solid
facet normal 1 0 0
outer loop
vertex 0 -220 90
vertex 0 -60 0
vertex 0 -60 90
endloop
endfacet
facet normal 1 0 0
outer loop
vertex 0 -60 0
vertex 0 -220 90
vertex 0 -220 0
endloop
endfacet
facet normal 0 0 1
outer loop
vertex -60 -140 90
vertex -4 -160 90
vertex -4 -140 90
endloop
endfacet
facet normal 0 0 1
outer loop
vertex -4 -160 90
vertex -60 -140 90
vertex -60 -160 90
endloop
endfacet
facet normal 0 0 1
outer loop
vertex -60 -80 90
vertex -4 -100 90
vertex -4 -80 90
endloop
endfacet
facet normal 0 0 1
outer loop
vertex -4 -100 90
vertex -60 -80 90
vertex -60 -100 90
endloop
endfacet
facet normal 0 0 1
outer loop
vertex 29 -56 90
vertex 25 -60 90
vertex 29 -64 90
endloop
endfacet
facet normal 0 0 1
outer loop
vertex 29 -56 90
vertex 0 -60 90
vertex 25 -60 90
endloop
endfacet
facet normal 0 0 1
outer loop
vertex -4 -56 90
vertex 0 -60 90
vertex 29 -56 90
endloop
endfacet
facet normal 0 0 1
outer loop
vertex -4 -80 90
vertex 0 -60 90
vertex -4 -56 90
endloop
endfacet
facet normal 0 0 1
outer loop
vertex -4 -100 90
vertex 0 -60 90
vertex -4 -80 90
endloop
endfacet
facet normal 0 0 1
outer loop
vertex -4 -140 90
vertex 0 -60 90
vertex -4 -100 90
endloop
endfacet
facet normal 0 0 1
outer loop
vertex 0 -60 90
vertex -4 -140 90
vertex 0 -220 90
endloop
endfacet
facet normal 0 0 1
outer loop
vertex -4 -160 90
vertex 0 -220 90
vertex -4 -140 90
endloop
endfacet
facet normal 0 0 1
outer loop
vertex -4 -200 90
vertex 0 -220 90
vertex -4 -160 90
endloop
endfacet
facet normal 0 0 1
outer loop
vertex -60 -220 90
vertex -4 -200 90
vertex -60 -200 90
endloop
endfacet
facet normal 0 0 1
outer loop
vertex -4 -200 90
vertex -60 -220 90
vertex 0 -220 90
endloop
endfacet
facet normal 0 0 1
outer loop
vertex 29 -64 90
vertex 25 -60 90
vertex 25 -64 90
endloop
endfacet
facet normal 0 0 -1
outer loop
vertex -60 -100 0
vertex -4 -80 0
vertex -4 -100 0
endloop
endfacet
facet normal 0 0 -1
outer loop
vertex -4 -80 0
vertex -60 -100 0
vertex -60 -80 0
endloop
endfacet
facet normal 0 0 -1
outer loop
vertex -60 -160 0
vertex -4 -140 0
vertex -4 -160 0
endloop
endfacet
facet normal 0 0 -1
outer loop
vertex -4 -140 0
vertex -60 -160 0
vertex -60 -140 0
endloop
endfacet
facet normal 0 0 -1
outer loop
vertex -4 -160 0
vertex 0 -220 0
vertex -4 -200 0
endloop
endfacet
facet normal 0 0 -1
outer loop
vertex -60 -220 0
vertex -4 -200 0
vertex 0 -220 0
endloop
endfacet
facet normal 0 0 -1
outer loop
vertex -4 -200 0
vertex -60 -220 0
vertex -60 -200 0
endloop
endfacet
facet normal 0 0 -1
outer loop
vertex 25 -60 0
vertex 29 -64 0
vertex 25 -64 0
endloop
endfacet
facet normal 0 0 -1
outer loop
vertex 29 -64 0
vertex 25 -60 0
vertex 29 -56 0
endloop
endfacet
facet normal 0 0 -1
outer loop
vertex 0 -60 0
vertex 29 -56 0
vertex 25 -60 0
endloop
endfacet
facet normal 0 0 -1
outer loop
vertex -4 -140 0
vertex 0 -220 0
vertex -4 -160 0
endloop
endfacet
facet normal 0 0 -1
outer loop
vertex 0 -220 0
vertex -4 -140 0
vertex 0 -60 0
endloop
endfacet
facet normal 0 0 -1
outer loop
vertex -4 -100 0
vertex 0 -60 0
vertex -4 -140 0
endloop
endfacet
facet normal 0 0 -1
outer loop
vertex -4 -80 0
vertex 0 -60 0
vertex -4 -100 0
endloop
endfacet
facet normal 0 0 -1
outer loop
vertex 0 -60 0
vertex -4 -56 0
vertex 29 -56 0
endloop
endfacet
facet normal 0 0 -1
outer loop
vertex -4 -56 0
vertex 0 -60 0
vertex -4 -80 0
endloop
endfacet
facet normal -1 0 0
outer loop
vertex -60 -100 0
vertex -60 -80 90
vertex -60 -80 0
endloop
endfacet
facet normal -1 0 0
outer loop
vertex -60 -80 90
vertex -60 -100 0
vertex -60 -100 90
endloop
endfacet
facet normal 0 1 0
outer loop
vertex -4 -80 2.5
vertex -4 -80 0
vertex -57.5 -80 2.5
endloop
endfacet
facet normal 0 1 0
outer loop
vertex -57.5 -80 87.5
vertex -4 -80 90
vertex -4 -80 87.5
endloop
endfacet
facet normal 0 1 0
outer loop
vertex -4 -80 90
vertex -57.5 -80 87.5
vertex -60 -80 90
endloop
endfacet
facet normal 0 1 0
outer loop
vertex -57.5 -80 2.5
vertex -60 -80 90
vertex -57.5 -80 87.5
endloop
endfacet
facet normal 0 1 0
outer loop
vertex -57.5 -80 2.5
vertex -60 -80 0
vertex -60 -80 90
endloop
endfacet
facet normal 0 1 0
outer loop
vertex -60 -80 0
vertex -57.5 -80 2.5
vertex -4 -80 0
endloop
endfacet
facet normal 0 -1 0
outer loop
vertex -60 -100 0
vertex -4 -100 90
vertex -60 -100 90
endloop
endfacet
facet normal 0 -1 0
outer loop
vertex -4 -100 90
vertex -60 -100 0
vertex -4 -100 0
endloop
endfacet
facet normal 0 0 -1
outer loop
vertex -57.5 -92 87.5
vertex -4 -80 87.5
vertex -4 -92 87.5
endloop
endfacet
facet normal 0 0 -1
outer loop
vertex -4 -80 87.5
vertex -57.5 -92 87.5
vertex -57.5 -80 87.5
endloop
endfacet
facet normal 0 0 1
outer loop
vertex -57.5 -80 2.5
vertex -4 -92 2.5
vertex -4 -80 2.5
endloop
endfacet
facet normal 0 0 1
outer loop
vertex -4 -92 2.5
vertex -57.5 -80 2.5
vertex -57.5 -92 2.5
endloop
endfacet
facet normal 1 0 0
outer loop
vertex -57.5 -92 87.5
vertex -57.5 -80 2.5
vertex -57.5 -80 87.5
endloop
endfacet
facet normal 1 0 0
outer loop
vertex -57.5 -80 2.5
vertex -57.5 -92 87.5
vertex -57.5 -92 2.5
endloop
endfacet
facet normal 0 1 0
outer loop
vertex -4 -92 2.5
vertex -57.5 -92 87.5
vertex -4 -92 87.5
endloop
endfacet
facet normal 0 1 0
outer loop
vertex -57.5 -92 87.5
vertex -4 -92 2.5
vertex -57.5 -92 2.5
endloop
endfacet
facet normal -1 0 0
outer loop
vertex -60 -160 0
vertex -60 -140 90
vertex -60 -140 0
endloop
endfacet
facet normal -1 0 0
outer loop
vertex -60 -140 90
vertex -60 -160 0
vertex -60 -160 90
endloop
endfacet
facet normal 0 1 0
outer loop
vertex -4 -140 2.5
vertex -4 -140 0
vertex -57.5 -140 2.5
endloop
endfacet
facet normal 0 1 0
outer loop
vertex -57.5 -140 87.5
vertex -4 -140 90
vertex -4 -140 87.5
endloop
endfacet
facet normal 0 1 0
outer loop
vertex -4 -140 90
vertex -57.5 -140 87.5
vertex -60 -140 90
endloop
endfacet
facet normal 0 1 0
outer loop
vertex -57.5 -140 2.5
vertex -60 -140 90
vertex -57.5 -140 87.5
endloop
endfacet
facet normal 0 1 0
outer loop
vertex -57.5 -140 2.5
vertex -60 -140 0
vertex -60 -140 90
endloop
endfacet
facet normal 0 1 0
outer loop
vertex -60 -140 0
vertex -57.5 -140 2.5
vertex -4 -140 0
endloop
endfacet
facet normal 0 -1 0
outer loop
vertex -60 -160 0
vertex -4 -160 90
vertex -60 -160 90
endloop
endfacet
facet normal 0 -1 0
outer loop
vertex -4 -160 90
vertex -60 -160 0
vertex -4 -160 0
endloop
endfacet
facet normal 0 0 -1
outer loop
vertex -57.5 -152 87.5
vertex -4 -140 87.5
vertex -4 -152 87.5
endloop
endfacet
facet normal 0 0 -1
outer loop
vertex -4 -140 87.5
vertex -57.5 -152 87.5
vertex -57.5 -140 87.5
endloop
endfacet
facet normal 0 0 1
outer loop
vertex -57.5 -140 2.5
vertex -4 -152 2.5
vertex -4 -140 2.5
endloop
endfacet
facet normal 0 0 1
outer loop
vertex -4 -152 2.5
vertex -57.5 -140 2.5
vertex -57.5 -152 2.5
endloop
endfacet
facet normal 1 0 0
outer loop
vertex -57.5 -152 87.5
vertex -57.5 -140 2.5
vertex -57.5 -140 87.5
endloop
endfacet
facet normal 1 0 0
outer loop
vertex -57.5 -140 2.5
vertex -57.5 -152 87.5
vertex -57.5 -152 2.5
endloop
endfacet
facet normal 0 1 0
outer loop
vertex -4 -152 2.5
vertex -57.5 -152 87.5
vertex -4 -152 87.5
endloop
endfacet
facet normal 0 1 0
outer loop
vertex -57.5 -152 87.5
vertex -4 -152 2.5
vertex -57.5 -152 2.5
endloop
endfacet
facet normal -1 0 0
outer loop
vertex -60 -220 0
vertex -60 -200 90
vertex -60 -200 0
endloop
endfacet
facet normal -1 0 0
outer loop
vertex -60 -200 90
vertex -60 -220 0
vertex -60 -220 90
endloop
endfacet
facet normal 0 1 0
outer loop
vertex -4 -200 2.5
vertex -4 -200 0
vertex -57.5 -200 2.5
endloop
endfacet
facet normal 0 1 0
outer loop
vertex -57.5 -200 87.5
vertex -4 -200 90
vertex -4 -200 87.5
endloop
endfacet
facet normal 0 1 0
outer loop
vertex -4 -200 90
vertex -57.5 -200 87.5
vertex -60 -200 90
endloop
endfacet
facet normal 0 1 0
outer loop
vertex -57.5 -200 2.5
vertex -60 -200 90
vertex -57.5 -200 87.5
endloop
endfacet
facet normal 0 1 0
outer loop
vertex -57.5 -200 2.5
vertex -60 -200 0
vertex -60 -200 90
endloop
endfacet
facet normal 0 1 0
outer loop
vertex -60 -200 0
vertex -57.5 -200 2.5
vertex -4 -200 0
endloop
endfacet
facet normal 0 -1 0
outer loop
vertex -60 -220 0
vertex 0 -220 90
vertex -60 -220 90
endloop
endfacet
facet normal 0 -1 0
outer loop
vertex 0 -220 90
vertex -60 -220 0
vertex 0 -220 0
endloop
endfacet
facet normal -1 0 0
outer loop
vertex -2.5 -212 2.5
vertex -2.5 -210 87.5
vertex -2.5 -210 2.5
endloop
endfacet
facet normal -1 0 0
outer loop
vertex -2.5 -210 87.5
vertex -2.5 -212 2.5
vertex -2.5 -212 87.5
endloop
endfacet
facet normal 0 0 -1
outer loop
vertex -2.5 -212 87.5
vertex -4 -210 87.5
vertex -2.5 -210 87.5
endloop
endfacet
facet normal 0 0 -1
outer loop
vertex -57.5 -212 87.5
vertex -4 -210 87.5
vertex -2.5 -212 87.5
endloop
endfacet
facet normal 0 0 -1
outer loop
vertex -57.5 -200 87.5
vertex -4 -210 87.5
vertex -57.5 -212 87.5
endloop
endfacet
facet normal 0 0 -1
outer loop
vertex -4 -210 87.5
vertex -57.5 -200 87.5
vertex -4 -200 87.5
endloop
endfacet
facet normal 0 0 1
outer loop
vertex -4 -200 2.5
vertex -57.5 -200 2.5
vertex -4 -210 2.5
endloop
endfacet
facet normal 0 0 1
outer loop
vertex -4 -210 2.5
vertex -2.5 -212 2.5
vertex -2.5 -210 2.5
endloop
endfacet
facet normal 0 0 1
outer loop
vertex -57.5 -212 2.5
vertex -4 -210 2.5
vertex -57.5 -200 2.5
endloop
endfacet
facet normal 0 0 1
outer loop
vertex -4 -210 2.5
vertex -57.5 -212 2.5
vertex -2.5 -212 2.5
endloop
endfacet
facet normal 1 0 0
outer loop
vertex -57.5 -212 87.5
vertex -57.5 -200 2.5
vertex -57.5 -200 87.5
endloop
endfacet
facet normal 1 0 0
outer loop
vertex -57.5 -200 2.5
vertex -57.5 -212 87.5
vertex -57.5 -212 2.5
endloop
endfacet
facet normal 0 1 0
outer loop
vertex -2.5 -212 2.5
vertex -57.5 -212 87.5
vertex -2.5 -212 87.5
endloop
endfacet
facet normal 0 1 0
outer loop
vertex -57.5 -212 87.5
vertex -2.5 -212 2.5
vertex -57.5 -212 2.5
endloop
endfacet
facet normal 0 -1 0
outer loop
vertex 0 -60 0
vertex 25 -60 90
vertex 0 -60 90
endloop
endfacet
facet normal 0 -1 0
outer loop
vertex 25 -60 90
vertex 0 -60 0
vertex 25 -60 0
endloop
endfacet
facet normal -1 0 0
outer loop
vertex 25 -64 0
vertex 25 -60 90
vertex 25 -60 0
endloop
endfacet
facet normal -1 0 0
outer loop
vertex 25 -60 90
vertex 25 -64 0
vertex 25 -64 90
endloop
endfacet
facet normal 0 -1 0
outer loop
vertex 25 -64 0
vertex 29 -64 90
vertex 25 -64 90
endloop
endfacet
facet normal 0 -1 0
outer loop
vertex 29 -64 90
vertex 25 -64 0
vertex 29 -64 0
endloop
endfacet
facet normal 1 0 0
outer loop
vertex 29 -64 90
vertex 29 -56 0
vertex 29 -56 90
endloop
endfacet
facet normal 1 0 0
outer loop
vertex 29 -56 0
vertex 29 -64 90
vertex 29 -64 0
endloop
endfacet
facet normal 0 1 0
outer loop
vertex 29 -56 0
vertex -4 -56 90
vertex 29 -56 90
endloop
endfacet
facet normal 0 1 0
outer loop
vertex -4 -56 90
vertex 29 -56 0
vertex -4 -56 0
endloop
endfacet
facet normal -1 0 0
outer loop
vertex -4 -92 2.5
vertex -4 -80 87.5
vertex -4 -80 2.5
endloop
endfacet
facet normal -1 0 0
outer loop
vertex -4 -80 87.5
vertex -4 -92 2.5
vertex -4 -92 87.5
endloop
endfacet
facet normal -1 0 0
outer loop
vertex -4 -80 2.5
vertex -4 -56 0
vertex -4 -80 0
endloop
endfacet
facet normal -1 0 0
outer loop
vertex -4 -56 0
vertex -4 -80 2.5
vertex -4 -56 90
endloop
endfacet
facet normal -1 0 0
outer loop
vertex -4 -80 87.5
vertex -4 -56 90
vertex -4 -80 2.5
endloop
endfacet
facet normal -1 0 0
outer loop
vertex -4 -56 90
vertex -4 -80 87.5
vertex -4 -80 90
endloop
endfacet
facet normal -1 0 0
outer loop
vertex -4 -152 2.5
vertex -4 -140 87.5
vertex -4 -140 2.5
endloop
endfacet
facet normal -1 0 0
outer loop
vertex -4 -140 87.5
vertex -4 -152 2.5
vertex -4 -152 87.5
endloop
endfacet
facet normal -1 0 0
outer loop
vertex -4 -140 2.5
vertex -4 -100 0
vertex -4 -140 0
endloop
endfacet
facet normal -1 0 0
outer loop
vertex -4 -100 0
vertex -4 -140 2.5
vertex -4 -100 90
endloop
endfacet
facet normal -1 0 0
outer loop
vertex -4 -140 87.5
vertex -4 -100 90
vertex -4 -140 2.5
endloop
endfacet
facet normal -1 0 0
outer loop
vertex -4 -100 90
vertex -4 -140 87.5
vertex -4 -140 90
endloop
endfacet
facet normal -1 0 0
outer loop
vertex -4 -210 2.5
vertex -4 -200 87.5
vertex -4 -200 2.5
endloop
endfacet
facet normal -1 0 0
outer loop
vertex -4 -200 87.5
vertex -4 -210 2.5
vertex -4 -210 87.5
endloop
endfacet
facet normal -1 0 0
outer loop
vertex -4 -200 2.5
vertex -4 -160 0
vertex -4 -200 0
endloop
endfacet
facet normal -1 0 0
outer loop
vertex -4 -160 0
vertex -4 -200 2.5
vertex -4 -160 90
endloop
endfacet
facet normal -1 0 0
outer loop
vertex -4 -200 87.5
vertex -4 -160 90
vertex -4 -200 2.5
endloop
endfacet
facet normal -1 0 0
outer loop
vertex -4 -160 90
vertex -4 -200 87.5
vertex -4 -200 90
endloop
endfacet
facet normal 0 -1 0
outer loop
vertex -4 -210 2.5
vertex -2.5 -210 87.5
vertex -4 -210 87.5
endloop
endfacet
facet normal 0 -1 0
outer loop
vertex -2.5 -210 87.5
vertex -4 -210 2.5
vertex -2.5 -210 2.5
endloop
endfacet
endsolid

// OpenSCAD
    
linear_extrude (height=90, $fn = 200)
import (file="profil.dxf", layer="5", $fn=500);

translate([-60,-100,0])
    difference(){
        cube ([60,20,90]);
        translate([2.5,8,2.5])
            cube ([55,45,85]);
    }
    
 translate([-60,-160,0])
    difference(){
        cube ([60,20,90]);
        translate([2.5,8,2.5])
            cube ([55,45,85]);
    }
       
   translate([-60,-220,0])
    difference(){
        cube ([60,20,90]);
        translate([2.5,8,2.5])
            cube ([55,45,85]);
    }
       
  
